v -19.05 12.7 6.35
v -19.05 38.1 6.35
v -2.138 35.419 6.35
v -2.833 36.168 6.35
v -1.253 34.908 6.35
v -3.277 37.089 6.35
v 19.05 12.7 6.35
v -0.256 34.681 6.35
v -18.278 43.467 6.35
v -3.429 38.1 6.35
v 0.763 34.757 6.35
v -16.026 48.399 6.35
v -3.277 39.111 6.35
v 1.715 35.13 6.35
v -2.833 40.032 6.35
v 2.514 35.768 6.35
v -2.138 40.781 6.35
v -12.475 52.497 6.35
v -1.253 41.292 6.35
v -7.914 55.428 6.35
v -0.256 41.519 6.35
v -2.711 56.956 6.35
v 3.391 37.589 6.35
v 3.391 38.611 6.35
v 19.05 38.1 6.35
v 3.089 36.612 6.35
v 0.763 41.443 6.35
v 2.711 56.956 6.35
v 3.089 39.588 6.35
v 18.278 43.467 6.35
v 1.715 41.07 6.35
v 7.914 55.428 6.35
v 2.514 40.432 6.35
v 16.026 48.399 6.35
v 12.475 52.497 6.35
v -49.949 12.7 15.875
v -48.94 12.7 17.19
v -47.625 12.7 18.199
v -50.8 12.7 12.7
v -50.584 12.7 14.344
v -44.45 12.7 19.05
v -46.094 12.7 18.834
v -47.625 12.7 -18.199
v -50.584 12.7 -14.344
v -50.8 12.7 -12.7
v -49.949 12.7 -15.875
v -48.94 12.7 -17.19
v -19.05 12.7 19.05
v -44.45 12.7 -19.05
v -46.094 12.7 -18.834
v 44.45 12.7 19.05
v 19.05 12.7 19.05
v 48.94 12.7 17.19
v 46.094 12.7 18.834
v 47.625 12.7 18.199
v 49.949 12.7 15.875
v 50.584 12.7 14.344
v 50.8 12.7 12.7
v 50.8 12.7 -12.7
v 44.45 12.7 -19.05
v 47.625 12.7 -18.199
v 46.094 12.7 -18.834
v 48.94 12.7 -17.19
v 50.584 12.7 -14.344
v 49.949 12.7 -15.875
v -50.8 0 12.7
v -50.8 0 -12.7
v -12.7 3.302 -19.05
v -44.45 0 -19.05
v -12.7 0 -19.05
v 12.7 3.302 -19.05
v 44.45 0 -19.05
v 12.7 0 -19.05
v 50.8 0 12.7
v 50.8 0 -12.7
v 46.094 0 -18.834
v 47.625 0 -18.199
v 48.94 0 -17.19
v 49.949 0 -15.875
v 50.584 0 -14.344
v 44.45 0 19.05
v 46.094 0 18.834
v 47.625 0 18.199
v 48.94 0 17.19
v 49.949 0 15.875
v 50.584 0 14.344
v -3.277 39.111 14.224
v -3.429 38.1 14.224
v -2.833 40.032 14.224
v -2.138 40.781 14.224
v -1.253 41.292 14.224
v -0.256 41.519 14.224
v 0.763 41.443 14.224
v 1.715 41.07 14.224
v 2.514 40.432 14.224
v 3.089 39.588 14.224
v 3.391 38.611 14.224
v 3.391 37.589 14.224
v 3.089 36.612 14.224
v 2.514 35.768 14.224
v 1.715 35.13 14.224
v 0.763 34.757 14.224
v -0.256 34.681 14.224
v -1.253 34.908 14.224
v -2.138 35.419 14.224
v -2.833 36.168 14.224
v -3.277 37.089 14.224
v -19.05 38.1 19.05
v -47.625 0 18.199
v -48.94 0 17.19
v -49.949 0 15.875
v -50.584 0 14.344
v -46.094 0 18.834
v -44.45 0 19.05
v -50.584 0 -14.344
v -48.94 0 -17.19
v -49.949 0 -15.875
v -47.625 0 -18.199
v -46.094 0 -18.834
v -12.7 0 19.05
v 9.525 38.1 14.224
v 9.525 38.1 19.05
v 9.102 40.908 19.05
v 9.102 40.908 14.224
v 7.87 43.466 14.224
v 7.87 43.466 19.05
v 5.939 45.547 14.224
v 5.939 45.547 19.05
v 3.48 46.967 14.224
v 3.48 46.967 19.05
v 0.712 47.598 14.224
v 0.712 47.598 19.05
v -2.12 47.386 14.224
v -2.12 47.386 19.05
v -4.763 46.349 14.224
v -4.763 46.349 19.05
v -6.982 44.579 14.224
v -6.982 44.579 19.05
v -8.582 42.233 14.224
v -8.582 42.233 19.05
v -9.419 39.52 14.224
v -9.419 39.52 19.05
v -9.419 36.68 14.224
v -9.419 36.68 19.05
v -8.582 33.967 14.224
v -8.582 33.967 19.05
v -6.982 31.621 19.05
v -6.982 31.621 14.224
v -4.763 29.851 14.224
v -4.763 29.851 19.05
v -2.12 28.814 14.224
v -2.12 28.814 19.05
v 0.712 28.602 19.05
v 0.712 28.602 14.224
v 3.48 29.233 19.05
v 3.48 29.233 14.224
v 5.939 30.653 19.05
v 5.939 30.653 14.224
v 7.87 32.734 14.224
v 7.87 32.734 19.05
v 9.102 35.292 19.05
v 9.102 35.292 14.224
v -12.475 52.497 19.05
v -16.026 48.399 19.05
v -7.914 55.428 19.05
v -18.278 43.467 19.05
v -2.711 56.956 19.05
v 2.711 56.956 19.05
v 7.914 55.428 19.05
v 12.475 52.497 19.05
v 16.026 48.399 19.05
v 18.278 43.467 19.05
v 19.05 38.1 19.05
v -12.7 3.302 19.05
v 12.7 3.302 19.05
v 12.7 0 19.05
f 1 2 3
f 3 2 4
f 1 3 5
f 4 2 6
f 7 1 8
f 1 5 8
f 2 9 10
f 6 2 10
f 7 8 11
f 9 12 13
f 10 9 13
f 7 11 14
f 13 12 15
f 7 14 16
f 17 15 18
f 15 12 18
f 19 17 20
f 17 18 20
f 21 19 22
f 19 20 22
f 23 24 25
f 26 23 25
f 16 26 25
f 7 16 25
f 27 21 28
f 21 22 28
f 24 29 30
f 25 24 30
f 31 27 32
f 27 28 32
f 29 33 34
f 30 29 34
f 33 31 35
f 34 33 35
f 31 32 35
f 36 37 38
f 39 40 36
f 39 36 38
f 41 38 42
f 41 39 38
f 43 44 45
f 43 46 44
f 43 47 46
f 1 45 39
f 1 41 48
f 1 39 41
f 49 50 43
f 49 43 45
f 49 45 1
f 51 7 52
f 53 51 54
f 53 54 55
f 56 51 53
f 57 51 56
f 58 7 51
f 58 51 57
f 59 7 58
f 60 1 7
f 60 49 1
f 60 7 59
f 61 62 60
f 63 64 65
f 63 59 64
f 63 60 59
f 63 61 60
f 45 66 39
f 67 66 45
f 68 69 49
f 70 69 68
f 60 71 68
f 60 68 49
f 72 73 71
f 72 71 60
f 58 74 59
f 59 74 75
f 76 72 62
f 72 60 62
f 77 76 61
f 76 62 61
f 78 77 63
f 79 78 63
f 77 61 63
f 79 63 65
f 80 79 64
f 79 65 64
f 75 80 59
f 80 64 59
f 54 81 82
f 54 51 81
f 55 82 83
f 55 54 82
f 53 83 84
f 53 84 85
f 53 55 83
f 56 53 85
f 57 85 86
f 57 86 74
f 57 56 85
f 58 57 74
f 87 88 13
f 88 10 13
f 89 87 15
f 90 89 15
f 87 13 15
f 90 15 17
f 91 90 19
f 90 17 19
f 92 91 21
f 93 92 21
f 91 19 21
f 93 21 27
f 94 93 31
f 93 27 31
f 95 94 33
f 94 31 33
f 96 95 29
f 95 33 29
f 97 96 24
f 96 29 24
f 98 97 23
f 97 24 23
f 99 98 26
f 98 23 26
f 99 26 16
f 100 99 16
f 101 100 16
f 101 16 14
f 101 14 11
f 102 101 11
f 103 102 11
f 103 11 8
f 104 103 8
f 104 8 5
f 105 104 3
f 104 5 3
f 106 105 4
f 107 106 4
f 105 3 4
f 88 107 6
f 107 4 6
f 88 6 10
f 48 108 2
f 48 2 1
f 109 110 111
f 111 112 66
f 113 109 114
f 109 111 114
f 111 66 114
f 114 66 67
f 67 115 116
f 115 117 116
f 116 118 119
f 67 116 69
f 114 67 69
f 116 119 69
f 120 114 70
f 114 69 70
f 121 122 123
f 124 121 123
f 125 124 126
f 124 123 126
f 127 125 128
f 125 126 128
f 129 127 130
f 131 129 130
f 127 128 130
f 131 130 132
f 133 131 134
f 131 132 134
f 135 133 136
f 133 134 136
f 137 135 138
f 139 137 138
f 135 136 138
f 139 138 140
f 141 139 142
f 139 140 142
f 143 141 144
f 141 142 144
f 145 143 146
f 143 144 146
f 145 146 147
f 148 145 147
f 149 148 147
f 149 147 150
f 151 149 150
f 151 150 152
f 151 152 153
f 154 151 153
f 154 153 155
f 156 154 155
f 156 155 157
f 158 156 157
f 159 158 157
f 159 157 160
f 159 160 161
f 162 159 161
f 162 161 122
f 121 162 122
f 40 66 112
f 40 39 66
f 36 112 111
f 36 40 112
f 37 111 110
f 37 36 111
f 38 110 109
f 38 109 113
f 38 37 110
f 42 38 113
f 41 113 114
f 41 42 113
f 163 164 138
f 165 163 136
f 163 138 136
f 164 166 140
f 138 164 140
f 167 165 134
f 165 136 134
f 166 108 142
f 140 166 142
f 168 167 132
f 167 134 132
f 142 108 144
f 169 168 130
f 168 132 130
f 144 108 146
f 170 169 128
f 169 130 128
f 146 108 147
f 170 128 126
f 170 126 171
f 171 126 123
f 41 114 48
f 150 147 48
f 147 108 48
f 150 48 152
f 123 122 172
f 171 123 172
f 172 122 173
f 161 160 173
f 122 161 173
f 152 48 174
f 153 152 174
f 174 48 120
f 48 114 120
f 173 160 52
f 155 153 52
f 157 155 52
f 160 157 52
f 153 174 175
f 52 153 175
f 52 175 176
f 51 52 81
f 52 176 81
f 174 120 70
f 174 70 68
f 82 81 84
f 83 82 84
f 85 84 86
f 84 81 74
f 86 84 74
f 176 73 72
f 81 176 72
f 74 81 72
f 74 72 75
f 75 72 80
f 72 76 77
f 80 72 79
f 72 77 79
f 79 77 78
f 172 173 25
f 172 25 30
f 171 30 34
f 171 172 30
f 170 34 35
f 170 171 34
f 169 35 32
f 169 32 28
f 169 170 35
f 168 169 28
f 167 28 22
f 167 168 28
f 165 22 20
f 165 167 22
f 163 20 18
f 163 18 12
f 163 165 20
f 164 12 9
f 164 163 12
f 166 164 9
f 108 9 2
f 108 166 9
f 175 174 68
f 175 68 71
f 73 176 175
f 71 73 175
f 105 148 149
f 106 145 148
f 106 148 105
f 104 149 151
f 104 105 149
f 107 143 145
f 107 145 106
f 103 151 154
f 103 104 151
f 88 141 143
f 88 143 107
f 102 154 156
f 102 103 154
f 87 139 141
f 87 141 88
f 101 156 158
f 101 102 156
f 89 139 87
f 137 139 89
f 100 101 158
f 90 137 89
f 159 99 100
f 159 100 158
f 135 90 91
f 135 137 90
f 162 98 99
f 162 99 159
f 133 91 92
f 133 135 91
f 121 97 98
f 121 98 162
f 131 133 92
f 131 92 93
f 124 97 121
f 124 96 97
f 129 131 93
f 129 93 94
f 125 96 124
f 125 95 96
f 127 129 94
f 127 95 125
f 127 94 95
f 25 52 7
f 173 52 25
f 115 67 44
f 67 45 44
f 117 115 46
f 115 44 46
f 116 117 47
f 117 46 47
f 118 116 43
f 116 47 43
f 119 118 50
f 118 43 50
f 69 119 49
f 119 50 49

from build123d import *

# Parameters (mm, degrees)
SKETCH2_W                                       = 101.6
SKETCH2_H                                       = 38.1
BOSS_EXTRUDE1_DEPTH                             = 12.7
SKETCH3_W                                       = 25.4
SKETCH3_H                                       = 3.302
CUT_EXTRUDE1_DEPTH                              = 65.757547823
BOSS_EXTRUDE2_DEPTH                             = 12.7
CBORE_FOR_0_PAN_HEAD_MACHINE_SCREW1_D           = 6.858
CBORE_FOR_0_PAN_HEAD_MACHINE_SCREW1_CBORE_D     = 19.05
CBORE_FOR_0_PAN_HEAD_MACHINE_SCREW1_CBORE_DEPTH = 4.826
FILLET1_R                                       = 6.35


with BuildPart() as part:
    # Sketch2 → Boss-Extrude1 (new body)
    with BuildSketch(Plane(origin=(0, 0, 0), x_dir=(1, 0, 0), z_dir=(0, 1, 0))):
        Rectangle(SKETCH2_W, SKETCH2_H)
    extrude(amount=BOSS_EXTRUDE1_DEPTH)

    # Sketch3 → Cut-Extrude1 (cut, through all)
    with BuildSketch(Plane.XY.offset(19.05)):
        with Locations((0, 1.651)):
            Rectangle(SKETCH3_W, SKETCH3_H)
    extrude(amount=-CUT_EXTRUDE1_DEPTH, mode=Mode.SUBTRACT)

    # Sketch5 → Boss-Extrude2 (add)
    with BuildSketch(Plane.XY.offset(19.05)):
        with BuildLine():
            Line((-19.05, 12.7), (19.05, 12.7))
            Line((19.05, 12.7), (19.05, 38.1))
            ThreePointArc((19.05, 38.1), (0, 57.15), (-19.05, 38.1))
            Line((-19.05, 38.1), (-19.05, 12.7))
        make_face()
    extrude(amount=-BOSS_EXTRUDE2_DEPTH)

    # CBORE for #0 Pan Head Machine Screw1 (through all)
    with Locations(Plane.XY.offset(19.05)):
        with Locations((0, 38.1)):
            CounterBoreHole(CBORE_FOR_0_PAN_HEAD_MACHINE_SCREW1_D / 2, CBORE_FOR_0_PAN_HEAD_MACHINE_SCREW1_CBORE_D / 2, CBORE_FOR_0_PAN_HEAD_MACHINE_SCREW1_CBORE_DEPTH)

    # Fillet1
    fillet1_edges = [part.edges().sort_by_distance(p)[0] for p in [
        (-50.8, 6.35, -19.05),
        (50.8, 6.35, -19.05),
        (50.8, 6.35, 19.05),
        (-50.8, 6.35, 19.05),
    ]]
    fillet(fillet1_edges, radius=FILLET1_R)


solid = part.part
